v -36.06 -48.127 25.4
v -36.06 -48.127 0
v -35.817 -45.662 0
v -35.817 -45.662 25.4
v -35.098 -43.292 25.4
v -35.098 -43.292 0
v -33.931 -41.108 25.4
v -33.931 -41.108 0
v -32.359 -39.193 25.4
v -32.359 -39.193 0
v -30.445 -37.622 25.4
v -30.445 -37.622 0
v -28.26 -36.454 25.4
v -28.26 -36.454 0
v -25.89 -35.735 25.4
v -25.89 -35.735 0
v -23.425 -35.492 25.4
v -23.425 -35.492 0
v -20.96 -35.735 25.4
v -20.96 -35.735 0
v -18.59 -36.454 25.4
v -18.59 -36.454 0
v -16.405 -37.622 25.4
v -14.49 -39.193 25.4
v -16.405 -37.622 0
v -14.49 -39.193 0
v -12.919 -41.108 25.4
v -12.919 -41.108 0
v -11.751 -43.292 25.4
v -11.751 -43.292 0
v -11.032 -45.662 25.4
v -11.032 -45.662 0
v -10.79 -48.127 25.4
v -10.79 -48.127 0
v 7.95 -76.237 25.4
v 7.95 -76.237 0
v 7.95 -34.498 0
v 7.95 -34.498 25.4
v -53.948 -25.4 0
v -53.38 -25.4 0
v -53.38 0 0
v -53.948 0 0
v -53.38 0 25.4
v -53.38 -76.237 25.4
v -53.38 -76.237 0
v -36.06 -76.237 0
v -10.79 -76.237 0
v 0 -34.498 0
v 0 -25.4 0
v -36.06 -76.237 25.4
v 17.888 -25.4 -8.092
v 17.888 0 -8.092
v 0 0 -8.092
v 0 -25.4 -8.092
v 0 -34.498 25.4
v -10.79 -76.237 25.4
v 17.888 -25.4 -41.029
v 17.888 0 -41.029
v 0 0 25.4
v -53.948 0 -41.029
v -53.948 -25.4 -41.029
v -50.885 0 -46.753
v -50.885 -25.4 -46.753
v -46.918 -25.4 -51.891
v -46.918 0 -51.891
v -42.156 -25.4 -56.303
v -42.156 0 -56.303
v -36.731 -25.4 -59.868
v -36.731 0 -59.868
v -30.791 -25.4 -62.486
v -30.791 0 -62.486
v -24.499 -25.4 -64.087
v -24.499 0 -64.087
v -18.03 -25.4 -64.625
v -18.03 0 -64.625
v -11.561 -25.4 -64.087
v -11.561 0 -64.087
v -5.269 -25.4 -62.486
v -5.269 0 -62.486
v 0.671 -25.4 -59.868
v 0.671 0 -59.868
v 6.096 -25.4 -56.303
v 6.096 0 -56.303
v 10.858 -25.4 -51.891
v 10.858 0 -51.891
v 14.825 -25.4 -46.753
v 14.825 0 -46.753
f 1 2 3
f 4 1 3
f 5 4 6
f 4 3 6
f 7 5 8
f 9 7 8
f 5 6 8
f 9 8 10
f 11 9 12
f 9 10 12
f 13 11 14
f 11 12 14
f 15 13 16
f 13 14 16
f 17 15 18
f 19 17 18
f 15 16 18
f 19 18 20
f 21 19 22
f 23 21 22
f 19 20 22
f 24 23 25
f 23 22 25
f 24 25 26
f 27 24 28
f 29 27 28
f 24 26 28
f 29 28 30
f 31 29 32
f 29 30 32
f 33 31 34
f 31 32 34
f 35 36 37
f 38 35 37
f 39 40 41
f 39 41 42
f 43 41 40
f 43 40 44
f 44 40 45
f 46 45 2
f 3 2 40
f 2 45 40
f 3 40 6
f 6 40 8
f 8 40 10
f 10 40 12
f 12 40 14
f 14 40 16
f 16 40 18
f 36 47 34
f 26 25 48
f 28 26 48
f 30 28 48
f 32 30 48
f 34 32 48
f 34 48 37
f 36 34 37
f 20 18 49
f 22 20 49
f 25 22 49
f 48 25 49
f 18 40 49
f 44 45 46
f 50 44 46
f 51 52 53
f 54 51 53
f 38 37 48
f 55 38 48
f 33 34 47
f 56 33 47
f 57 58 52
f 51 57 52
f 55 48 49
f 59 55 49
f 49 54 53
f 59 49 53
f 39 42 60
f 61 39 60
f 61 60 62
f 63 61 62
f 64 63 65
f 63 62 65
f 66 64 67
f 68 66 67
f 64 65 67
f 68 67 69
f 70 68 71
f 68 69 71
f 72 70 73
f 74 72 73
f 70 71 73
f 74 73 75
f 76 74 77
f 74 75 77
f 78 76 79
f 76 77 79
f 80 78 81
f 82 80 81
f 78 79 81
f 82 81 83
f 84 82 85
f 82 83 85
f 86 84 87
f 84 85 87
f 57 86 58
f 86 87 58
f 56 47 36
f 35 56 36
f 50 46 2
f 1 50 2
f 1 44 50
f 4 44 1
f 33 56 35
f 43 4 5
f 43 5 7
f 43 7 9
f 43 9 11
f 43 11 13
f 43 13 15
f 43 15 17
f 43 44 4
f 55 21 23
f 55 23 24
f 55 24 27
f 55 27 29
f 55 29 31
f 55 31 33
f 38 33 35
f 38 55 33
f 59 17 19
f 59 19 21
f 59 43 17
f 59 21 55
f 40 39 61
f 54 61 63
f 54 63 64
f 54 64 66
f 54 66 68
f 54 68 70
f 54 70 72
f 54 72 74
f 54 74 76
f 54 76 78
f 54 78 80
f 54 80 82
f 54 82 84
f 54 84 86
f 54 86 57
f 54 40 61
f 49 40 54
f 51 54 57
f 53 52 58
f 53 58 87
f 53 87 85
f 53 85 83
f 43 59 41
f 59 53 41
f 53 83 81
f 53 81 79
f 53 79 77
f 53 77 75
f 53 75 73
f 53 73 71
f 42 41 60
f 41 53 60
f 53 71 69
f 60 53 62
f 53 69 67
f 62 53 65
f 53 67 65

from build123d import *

# Parameters (mm, degrees)
F1_DEPTH = 25.4
F3_DEPTH = 25.4


# Not quite as in the source:
# - ends of sketch curves that miss each other by under 0.0002 mm in the source are joined


with BuildPart() as f1:
    # F0 (on Front) → F1 (new body)
    with BuildSketch(Plane.XZ):
        with BuildLine():
            Line((0, 0), (-53.9480485022, 0))
            Line((-53.9480485022, 0), (-53.9480485022, -41.0289131105))
            ThreePointArc((-53.9480485022, -41.0289131105), (-18.0300064385, -64.6250791293), (17.8880356252, -41.0289131105))
            Line((17.8880356252, -41.0289131105), (17.8880356252, -8.0922106281))
            Line((17.8880356252, -8.0922106281), (0, -8.0922106281))
            Line((0, -8.0922106281), (0, 0))
        make_face()
    extrude(amount=F1_DEPTH)

    # F2 (on Top) → F3 (join)
    with BuildSketch(Plane.XY):
        with BuildLine():
            Line((0, -34.4983525574), (0, -25.6963036954))
            Line((0, -25.6963036954), (0, 0))
            Line((0, 0), (-53.380176425, 0))
            Line((-53.380176425, 0), (-53.380176425, -25.9802397341))
            Line((-53.380176425, -25.9802397341), (-53.380176425, -76.2371048331))
            Line((-53.380176425, -76.2371048331), (-36.0600091517, -76.2371048331))
            Line((-36.0600091517, -76.2371048331), (-36.0600091517, -48.1273345649))
            ThreePointArc((-36.0600091517, -48.1273345649), (-23.424807936, -35.4921333492), (-10.7896067202, -48.1273345649))
            Line((-10.7896067202, -48.1273345649), (-10.7896067202, -76.2371048331))
            Line((-10.7896067202, -76.2371048331), (7.9502388835, -76.2371048331))
            Line((7.9502388835, -76.2371048331), (7.9502388835, -34.4983525574))
            Line((7.9502388835, -34.4983525574), (0, -34.4983525574))
        make_face()
    extrude(amount=F3_DEPTH)


solid = f1.part
